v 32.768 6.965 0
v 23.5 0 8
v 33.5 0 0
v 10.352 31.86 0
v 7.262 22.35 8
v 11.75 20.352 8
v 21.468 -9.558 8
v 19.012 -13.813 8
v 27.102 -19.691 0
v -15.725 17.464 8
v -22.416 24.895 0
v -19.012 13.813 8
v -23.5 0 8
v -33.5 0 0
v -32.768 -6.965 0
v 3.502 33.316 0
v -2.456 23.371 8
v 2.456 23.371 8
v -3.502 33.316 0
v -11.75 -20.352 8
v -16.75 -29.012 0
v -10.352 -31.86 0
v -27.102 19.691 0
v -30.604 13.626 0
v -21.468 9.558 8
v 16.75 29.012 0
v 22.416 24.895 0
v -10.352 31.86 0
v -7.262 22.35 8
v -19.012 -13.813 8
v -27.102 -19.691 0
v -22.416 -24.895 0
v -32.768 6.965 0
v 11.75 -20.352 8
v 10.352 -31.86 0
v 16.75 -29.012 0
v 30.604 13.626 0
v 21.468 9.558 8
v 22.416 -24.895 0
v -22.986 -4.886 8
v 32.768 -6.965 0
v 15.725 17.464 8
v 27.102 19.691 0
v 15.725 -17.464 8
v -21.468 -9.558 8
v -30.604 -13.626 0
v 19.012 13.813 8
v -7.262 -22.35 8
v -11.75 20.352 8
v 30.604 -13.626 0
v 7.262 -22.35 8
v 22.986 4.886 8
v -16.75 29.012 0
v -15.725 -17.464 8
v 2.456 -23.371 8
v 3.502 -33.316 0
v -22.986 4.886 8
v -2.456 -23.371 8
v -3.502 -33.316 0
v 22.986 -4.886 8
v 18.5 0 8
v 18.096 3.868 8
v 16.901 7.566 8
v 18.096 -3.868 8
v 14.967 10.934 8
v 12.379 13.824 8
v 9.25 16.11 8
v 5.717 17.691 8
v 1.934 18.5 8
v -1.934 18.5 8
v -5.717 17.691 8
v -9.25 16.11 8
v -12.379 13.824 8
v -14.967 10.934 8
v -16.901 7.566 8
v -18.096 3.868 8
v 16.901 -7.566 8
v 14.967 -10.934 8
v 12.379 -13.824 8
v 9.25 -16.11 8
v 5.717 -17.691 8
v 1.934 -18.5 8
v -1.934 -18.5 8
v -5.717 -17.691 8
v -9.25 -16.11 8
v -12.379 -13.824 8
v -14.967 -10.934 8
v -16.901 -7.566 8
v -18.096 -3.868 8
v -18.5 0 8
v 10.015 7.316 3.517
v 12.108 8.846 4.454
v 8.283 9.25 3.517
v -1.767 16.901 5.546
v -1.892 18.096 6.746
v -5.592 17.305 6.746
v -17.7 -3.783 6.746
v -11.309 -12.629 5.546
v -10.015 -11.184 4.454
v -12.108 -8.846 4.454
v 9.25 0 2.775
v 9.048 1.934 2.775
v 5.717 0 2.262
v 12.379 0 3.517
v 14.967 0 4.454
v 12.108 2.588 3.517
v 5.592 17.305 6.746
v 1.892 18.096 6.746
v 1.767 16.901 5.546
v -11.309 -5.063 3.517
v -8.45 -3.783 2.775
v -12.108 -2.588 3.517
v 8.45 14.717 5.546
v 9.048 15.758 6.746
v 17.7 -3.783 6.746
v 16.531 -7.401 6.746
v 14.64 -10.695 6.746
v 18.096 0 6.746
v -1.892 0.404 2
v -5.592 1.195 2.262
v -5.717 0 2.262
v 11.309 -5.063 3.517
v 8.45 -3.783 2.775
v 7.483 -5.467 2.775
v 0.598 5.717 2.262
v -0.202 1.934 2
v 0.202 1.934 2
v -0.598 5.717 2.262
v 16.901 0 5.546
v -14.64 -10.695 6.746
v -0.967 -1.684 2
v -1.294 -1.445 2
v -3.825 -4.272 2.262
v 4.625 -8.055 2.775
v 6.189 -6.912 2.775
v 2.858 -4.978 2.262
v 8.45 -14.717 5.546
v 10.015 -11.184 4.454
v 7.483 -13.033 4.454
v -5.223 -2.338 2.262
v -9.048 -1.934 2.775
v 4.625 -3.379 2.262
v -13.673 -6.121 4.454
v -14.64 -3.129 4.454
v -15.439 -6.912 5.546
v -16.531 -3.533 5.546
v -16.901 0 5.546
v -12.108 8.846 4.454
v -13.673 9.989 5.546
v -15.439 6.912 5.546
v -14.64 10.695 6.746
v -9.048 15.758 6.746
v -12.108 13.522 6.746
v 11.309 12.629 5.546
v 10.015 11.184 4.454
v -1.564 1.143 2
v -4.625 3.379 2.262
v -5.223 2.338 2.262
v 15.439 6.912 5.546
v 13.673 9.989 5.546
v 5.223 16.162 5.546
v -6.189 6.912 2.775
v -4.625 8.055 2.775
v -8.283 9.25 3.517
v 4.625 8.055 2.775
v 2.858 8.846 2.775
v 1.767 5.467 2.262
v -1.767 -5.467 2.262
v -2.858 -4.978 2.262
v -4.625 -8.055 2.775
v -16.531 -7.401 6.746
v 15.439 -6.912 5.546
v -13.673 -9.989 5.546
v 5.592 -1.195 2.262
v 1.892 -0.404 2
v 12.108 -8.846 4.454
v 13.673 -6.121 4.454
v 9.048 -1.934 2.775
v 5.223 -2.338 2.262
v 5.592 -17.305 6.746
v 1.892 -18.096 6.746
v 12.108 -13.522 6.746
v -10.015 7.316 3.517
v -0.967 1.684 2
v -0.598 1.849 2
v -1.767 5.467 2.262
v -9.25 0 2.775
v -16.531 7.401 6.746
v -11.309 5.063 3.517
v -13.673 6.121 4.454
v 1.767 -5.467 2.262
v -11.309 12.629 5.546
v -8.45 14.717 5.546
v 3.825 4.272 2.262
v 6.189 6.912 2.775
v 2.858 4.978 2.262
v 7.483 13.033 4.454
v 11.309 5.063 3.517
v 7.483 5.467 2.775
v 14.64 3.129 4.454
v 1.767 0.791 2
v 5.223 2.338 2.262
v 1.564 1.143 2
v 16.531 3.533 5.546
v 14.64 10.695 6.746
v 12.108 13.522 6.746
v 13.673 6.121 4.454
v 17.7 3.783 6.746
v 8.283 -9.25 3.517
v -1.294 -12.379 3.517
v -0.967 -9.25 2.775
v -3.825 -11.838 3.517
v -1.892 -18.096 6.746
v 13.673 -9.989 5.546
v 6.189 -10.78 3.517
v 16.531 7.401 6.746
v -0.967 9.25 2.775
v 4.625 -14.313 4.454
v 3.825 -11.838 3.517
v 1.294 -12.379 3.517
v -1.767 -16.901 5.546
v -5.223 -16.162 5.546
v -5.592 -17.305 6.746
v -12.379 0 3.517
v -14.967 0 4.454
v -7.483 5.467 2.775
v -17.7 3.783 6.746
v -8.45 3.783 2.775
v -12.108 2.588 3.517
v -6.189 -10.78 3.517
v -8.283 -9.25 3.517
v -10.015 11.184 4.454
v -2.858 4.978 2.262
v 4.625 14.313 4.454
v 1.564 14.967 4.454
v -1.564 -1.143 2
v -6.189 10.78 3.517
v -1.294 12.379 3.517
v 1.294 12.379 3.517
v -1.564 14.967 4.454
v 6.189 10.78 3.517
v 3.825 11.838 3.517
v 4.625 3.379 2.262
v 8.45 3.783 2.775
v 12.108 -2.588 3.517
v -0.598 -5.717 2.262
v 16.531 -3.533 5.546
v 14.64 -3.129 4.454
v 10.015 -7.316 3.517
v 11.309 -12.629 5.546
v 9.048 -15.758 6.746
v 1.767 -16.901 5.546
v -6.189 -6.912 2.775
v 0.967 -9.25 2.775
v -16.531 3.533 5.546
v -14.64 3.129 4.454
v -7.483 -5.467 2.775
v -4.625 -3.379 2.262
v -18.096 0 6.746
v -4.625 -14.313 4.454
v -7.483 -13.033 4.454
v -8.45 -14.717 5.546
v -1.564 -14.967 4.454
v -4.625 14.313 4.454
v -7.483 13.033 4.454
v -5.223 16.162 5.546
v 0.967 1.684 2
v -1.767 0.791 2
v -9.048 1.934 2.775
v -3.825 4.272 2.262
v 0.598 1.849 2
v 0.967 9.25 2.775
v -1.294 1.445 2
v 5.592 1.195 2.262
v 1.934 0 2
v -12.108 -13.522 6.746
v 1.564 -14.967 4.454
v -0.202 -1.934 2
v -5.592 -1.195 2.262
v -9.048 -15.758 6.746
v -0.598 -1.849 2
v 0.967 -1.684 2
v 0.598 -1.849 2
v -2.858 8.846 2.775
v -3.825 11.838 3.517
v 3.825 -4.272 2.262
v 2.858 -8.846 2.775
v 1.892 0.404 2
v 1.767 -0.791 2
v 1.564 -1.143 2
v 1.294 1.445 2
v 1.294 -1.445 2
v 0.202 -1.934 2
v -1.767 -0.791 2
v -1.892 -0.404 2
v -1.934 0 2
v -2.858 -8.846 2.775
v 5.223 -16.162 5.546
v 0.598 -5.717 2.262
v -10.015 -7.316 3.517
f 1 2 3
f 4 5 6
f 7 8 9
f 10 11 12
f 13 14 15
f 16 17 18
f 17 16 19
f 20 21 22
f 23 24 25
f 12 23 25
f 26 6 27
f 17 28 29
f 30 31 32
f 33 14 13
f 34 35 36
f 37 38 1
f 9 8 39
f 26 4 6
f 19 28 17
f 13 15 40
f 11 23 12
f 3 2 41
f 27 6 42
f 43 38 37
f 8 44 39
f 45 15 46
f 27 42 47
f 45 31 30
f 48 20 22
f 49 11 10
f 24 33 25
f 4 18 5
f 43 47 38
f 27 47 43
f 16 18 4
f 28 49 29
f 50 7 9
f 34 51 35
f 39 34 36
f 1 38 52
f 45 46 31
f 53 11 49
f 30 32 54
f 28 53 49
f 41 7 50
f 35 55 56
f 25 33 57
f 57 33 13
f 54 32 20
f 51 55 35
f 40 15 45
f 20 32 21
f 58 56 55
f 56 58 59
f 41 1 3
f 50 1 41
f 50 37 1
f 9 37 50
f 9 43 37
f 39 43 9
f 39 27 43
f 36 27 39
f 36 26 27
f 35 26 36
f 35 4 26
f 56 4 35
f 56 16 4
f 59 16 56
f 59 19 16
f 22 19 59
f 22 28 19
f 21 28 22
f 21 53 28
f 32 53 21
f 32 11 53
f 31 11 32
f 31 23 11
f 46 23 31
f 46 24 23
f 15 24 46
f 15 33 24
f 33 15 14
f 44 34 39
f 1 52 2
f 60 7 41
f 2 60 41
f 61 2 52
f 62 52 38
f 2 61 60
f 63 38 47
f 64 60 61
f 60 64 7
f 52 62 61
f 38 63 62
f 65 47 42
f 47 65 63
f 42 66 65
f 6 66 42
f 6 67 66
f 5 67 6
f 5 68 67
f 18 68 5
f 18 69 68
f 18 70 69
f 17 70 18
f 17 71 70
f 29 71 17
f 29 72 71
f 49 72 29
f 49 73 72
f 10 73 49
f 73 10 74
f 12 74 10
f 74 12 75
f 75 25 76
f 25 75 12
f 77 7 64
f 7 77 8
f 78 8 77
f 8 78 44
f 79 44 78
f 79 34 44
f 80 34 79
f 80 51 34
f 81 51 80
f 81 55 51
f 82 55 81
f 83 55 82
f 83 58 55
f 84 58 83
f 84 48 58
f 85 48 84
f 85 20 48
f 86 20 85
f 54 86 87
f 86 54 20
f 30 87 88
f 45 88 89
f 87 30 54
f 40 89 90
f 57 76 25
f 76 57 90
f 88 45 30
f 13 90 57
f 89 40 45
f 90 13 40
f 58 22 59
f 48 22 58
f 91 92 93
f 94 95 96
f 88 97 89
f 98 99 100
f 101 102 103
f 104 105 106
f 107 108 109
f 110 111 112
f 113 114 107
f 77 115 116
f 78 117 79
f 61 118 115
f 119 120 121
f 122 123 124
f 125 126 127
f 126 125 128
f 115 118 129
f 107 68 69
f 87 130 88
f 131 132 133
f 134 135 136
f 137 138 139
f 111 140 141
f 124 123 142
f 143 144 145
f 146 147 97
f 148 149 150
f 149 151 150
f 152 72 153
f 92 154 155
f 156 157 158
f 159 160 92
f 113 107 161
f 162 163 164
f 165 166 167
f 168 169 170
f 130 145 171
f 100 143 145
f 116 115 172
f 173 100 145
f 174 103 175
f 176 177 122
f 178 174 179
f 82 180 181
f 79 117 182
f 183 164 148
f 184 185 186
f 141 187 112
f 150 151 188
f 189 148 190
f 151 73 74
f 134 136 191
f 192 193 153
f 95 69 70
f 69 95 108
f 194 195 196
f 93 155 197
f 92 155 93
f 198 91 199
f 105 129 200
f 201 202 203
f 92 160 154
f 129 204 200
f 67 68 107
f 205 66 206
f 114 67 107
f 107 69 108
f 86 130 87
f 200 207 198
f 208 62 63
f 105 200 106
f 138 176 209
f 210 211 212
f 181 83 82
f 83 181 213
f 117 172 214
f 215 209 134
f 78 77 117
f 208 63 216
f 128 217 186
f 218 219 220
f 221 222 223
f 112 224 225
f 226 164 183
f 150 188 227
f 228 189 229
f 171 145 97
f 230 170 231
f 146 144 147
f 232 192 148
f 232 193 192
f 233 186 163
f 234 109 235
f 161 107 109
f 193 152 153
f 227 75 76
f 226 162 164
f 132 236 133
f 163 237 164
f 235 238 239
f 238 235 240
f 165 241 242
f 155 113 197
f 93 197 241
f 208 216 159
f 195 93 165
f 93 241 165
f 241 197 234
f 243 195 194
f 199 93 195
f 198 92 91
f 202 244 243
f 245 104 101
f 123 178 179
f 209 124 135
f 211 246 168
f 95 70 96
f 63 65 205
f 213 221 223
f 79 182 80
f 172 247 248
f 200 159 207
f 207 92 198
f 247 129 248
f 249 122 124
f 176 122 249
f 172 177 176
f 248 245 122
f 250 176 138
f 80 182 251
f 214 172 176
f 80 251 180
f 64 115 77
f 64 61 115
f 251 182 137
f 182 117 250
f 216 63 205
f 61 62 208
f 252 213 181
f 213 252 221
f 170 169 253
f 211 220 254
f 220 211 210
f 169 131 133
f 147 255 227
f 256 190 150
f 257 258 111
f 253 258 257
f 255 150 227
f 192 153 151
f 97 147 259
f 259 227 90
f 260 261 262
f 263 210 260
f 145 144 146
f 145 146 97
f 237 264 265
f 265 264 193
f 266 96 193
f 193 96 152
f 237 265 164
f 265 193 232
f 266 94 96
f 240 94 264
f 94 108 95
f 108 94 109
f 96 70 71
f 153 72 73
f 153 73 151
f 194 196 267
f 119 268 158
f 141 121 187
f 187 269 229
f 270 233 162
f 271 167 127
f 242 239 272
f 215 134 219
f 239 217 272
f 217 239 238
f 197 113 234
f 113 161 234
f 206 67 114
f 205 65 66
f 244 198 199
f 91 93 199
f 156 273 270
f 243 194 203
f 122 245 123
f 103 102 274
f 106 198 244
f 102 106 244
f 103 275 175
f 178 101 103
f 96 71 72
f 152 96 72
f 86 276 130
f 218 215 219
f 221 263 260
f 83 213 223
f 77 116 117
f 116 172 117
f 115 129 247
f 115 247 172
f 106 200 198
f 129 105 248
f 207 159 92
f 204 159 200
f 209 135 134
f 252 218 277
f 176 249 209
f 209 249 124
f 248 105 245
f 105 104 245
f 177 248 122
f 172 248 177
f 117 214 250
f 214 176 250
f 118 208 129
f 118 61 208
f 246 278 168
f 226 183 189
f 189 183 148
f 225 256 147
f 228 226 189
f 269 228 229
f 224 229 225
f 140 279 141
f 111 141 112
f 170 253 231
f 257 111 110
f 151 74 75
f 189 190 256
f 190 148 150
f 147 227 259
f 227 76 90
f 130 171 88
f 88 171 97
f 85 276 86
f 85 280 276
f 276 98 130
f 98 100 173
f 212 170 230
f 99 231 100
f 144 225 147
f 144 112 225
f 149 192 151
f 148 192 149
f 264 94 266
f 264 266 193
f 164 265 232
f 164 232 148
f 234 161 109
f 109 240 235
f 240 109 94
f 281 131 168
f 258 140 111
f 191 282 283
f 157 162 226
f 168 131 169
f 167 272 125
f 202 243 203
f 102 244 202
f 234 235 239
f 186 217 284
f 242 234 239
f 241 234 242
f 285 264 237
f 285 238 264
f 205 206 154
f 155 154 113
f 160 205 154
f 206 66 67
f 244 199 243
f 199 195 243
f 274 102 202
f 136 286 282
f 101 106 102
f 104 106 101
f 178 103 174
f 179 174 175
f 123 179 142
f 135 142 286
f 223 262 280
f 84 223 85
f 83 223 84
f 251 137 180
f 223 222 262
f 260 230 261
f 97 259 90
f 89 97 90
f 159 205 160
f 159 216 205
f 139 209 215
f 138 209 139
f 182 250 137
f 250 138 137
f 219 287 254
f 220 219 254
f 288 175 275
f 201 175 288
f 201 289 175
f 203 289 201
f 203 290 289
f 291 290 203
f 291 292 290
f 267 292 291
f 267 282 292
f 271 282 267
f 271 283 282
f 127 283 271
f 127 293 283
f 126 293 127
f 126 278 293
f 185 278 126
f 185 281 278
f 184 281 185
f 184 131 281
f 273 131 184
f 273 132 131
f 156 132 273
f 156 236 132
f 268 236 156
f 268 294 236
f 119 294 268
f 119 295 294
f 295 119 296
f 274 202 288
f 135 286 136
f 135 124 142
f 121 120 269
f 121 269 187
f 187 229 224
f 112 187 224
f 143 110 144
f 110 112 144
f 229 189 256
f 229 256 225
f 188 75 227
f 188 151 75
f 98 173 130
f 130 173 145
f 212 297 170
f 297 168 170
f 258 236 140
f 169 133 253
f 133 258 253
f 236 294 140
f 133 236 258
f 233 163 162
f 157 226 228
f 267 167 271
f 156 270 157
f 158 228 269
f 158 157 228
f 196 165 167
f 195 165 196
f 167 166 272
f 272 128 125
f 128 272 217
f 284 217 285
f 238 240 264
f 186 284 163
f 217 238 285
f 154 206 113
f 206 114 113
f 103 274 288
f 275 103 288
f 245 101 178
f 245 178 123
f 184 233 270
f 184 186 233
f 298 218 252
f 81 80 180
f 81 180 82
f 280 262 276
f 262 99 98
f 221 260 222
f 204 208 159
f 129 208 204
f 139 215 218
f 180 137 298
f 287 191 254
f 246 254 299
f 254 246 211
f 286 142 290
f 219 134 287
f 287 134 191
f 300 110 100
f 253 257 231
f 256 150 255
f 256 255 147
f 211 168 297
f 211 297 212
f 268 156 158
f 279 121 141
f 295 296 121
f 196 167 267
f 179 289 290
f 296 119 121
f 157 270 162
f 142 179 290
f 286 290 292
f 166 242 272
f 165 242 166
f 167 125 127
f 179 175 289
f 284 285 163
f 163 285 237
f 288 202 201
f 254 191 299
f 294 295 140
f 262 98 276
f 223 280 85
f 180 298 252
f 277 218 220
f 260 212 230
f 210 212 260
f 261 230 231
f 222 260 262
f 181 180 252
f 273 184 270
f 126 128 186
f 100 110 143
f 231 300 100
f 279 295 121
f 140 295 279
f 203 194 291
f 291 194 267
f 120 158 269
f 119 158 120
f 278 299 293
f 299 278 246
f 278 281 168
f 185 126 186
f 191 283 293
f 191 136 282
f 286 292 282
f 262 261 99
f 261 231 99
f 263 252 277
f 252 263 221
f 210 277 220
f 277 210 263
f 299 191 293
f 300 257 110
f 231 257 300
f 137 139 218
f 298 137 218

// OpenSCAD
//Height of the ant trap:
height = 8;

//Width of the ant trap:
diameter = 67;

//How wide should the lip be?
lip_width = 5;

//How much material under the lowest point of the dish?
min_bottom = 2;

//How much wider is the base than the top of the dish?
base_enlargement = 10;

difference(){

//base of trap:
translate([0,0, height/2]) 
	cylinder(h = height, r1 = diameter/2, r2 = diameter/2-base_enlargement, center = true);

//Poison well:
translate([0,0, height])
	resize(newsize = [diameter-((lip_width+base_enlargement)*2), diameter-((lip_width+base_enlargement)*2), (height*2)-(min_bottom * 2)]) 
		sphere(r=10, center=true);

}
